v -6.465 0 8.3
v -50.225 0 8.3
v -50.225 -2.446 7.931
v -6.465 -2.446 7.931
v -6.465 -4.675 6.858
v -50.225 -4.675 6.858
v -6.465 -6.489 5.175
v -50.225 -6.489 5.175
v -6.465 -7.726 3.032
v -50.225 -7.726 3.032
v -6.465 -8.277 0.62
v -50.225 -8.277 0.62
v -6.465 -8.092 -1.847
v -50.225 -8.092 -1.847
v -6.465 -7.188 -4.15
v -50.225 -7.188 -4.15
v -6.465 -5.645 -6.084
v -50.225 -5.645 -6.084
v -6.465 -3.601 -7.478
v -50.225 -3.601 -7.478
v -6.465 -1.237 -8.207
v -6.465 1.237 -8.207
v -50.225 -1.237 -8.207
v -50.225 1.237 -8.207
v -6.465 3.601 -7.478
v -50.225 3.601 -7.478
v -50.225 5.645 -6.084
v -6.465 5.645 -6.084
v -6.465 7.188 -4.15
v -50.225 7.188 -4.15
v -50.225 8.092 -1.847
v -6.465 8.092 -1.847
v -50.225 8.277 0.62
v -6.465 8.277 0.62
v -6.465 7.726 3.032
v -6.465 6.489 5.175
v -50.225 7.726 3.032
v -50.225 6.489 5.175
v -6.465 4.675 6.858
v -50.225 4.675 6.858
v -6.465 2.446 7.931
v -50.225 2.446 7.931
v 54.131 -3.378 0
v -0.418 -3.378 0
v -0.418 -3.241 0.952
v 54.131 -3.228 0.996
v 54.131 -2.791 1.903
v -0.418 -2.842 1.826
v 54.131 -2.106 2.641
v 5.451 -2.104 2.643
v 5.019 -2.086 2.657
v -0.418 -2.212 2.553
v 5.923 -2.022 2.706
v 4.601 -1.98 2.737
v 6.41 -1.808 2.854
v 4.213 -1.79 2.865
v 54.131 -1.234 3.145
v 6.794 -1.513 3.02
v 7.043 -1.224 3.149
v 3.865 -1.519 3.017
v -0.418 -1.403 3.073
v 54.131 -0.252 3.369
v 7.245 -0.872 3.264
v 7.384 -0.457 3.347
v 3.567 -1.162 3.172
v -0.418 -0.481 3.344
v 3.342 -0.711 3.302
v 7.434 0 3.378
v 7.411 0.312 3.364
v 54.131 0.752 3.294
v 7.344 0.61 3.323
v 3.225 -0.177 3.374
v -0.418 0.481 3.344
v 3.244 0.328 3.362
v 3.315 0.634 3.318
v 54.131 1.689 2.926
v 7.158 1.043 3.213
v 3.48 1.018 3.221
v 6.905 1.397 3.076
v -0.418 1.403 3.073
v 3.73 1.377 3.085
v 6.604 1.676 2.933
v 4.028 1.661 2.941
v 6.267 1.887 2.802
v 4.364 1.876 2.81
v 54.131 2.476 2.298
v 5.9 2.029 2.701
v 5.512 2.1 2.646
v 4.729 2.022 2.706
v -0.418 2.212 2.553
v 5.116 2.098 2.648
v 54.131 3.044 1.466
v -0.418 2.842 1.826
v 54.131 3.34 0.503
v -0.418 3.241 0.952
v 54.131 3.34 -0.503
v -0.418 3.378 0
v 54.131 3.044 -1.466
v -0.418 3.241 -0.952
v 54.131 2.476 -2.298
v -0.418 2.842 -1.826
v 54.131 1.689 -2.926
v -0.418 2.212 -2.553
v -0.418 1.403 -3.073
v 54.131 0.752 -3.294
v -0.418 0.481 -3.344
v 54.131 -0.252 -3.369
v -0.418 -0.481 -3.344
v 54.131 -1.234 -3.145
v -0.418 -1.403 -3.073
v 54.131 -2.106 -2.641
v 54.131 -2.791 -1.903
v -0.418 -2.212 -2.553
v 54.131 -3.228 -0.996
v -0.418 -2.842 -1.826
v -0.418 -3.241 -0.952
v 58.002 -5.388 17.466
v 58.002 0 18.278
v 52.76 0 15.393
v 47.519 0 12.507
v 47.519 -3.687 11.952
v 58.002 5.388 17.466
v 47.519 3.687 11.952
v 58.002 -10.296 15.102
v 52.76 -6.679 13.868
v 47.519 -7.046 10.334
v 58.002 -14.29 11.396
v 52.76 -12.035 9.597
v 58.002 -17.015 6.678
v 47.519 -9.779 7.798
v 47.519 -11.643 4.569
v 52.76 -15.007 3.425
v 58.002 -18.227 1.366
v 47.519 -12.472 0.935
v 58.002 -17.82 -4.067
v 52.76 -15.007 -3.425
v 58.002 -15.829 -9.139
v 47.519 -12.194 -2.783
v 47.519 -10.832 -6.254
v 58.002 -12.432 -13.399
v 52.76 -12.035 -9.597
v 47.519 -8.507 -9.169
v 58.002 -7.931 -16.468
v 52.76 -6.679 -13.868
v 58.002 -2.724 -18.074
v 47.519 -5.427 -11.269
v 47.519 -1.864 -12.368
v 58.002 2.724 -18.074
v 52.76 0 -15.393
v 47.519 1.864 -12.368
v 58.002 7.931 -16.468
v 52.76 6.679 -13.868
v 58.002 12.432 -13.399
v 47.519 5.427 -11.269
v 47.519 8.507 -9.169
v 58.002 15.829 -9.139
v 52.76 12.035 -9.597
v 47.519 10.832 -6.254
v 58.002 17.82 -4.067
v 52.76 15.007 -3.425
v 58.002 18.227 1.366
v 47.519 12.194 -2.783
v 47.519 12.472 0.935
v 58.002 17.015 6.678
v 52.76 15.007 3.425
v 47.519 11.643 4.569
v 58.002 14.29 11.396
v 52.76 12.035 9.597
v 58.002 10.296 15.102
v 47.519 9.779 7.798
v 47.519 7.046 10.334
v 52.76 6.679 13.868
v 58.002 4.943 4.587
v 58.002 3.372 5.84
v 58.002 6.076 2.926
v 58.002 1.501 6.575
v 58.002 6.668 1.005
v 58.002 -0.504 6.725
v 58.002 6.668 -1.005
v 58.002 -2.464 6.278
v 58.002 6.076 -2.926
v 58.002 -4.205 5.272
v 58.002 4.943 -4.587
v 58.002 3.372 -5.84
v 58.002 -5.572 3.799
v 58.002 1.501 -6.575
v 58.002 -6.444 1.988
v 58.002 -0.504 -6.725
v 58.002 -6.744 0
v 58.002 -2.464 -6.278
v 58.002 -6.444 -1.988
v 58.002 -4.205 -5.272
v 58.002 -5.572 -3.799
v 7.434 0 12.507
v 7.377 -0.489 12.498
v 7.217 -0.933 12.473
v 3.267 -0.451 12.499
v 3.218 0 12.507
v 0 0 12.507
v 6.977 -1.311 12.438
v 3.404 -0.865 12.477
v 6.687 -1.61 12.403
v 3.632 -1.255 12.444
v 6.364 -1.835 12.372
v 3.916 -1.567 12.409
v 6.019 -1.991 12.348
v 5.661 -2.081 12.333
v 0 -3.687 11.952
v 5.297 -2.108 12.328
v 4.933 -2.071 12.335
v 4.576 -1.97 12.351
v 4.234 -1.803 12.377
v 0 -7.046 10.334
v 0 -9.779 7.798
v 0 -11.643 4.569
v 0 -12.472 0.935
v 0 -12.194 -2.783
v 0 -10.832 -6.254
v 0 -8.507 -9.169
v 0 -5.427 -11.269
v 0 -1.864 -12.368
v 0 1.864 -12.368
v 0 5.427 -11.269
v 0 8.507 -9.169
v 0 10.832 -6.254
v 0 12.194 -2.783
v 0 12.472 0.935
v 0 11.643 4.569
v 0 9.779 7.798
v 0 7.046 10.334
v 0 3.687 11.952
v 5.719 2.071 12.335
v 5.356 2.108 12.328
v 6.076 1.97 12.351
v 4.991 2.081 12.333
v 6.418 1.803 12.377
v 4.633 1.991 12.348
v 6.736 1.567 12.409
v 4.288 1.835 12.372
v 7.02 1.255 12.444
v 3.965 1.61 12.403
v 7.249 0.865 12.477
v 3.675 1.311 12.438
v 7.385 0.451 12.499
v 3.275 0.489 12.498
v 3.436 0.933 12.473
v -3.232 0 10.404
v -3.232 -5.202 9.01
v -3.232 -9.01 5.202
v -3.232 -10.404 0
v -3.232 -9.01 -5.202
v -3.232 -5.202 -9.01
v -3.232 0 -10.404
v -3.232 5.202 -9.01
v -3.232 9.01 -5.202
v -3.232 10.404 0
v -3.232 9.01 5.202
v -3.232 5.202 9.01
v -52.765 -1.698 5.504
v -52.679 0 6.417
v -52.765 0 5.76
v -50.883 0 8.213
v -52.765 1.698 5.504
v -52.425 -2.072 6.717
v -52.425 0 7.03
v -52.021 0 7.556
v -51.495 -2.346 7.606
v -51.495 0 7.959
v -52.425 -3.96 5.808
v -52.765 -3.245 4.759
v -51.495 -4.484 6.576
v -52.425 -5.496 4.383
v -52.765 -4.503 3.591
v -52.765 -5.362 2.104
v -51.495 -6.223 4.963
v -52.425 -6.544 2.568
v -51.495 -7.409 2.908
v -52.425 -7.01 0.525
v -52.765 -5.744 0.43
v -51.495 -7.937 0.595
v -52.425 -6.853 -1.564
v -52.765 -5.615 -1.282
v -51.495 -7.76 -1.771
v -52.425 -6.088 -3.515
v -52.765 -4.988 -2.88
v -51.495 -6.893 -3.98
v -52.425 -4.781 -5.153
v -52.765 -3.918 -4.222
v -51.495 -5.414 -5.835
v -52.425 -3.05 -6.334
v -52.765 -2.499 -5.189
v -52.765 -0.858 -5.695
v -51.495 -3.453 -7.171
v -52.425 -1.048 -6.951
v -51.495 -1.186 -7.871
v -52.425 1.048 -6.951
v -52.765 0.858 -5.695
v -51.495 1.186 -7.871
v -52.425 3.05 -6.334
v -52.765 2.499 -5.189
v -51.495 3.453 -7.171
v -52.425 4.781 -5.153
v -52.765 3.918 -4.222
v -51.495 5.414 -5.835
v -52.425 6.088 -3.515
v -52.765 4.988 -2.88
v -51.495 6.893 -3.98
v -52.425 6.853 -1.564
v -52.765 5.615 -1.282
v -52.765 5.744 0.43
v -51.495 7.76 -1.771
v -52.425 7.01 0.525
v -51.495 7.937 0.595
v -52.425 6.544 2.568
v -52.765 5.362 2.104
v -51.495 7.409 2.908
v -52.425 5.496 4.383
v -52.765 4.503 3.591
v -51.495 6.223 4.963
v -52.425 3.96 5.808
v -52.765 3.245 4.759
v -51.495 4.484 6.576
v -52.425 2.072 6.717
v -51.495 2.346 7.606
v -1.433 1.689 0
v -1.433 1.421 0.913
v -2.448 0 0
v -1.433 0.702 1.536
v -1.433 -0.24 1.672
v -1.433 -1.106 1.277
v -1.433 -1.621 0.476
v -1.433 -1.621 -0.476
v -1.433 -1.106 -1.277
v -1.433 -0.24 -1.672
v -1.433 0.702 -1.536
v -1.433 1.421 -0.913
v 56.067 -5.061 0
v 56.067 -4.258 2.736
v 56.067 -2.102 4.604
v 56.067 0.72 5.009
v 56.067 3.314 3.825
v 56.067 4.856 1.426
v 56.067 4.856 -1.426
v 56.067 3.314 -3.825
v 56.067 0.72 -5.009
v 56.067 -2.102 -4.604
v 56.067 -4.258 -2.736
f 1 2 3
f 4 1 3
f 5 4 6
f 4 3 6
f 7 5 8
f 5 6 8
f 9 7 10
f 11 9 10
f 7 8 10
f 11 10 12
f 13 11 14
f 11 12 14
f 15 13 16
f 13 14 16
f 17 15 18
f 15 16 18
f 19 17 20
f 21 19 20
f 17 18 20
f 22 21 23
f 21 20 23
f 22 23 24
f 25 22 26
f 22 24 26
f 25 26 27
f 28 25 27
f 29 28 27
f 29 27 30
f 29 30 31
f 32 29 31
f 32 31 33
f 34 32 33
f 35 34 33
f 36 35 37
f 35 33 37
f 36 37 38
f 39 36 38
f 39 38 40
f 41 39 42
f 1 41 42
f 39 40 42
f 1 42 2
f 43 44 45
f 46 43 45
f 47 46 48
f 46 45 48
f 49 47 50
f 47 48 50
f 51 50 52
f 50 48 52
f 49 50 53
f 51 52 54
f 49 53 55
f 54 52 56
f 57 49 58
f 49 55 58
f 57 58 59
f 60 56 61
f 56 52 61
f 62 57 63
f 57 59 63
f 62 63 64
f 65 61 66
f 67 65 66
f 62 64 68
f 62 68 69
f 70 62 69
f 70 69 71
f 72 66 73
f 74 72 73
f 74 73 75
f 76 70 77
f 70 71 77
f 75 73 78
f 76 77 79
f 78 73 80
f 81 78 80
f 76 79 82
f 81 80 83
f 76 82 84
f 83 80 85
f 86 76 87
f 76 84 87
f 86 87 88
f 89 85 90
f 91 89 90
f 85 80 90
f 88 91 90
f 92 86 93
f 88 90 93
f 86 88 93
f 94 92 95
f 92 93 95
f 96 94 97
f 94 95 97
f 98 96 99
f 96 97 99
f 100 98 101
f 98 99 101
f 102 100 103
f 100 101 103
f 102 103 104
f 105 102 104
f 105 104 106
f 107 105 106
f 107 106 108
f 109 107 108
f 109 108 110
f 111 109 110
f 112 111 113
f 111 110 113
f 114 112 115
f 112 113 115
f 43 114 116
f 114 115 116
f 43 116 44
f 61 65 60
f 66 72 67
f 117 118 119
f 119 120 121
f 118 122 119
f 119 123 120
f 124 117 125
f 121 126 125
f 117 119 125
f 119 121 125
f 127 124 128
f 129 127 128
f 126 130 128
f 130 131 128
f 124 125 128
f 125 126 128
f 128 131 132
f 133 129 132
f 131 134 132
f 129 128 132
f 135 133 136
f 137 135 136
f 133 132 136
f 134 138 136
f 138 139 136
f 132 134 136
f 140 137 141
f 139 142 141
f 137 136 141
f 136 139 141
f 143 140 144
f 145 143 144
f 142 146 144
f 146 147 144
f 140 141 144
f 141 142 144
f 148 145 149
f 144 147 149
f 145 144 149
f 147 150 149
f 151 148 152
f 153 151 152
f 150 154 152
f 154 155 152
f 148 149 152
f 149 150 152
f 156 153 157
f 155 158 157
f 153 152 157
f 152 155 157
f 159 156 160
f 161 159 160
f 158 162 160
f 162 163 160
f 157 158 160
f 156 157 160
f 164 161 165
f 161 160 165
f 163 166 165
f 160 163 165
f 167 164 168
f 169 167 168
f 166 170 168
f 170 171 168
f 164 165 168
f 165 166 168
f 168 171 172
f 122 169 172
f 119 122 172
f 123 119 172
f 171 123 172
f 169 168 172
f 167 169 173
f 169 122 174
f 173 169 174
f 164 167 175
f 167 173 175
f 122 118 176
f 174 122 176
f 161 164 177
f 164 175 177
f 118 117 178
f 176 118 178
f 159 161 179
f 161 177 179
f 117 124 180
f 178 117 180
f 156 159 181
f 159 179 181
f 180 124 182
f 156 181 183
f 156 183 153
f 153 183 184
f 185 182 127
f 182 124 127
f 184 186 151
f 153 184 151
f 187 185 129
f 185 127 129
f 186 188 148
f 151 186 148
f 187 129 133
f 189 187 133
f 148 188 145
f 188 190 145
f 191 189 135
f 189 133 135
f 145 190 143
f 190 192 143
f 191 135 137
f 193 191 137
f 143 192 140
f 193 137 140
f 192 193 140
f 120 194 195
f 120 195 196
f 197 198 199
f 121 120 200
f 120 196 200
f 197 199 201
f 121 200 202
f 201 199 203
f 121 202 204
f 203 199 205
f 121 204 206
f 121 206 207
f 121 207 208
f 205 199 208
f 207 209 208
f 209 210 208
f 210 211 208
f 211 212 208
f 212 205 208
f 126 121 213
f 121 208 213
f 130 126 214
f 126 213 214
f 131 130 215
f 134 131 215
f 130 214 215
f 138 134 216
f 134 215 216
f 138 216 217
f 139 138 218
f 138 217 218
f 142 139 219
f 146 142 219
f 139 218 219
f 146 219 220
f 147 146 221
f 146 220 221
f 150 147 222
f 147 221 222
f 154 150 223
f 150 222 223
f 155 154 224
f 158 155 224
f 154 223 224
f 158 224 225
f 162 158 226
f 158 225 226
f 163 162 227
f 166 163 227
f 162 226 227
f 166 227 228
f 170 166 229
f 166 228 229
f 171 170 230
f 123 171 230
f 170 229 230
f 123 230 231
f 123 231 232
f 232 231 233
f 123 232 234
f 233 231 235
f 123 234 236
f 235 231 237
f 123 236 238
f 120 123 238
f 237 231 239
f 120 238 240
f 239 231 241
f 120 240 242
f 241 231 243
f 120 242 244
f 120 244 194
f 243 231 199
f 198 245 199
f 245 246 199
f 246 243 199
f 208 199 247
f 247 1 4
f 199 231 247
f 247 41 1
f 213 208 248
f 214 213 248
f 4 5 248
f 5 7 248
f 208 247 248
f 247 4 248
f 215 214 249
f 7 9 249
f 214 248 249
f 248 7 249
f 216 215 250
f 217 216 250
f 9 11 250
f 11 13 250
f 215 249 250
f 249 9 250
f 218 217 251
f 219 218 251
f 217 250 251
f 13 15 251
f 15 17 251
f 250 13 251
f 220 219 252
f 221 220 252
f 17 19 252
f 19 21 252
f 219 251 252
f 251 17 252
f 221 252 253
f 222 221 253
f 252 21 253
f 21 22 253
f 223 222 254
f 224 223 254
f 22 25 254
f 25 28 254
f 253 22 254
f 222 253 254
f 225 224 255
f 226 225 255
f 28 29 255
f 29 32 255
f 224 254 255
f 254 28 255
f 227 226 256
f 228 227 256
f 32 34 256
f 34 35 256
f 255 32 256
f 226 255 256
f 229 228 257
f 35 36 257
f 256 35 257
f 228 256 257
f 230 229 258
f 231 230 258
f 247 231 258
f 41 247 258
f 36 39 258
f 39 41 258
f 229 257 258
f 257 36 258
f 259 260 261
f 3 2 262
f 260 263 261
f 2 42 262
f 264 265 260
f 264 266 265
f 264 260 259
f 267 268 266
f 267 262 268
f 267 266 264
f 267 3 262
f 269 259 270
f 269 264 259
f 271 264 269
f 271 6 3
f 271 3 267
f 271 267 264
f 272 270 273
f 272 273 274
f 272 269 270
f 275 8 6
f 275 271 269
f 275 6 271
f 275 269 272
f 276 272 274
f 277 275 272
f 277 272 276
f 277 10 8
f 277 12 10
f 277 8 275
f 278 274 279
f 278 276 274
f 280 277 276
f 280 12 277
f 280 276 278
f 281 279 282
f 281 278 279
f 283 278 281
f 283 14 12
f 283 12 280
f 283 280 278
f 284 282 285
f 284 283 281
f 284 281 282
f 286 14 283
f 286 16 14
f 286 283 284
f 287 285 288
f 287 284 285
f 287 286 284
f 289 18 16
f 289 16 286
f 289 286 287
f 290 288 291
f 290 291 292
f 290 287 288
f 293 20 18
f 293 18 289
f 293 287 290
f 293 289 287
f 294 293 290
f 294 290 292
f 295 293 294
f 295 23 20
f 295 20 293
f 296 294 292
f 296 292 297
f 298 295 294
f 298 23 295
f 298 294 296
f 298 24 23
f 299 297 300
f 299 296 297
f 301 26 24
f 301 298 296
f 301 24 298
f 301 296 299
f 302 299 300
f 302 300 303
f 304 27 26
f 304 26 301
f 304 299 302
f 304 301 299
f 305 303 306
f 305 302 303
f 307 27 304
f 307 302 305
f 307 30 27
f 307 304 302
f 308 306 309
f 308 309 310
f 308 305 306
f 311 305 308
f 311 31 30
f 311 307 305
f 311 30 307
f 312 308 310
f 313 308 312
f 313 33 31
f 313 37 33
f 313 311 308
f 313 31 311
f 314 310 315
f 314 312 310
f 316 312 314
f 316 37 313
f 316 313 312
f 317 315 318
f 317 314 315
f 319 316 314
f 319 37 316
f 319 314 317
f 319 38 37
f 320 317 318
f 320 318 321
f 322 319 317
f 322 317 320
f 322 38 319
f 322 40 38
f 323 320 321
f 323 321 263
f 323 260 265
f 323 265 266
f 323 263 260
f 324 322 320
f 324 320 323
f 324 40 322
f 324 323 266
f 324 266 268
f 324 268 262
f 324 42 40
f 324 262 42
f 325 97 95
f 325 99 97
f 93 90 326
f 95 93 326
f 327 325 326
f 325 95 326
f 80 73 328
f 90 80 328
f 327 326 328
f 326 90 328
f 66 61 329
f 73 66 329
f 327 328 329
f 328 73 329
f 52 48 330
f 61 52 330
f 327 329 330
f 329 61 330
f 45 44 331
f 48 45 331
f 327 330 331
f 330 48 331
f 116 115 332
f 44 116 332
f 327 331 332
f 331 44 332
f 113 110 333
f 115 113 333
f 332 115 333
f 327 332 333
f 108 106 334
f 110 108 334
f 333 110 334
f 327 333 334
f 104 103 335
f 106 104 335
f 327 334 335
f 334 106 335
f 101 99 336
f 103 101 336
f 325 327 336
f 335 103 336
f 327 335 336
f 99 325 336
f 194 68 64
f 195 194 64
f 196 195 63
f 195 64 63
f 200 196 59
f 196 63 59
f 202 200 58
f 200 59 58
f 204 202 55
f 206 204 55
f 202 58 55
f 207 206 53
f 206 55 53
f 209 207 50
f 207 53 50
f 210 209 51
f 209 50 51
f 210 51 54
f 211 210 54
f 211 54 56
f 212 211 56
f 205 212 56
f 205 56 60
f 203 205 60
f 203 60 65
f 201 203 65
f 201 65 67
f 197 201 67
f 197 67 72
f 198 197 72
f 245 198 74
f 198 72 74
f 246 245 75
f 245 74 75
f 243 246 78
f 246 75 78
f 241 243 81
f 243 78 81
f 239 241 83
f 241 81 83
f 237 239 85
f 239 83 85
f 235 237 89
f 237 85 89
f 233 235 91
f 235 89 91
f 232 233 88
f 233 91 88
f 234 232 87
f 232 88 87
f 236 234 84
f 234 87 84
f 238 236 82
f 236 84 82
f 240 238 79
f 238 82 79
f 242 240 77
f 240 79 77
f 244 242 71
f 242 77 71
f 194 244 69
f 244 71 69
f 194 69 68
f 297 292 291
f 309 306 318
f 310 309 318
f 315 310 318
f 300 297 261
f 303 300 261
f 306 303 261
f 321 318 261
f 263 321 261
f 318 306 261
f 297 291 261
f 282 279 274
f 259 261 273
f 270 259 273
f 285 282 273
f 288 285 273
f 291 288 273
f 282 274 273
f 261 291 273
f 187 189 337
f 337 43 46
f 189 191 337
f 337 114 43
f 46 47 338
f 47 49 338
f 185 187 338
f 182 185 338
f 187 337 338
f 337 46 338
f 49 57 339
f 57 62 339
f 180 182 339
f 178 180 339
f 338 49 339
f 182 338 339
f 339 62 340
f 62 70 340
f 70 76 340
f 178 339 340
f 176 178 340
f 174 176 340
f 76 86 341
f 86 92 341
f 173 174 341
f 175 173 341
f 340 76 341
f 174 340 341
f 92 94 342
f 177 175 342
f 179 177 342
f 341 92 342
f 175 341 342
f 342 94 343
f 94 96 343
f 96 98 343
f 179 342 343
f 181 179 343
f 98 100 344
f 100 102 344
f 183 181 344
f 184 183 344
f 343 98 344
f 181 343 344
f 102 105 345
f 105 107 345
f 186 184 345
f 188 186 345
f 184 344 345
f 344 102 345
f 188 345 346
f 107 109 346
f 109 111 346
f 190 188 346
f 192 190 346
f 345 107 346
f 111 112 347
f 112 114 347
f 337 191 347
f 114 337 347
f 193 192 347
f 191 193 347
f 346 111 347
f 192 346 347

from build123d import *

# Parameters (mm, degrees)
F2_R           = 2.54
F4_D           = 6.7564
F4_DEPTH       = 58.42
F4_CSINK_D     = 13.4874
F4_CSINK_ANGLE = 82
F4_TIP         = 2.0298273432
F6_D           = 4.2164
F6_DEPTH       = 18.2792094926


with BuildPart() as f1:
    # F0 (on Front) → F1 (revolve)
    with BuildSketch(Plane.XZ):
        Polygon((-52.7651011944, 8.2997372374), (-52.7651011944, 0), (58.0023080111, 0), (58.0023080111, 12.5073799863), (58.0023080111, 18.2782094926), (47.5186370313, 12.5073799863), (0, 12.5073799863), (-6.4646434039, 8.2997372374), align=None)
    revolve(axis=Axis((-11.7605924606, 0, 0), (1, 0, 0)))

    # F2
    f2_edges = [f1.edges().sort_by_distance(p)[0] for p in [
        (-52.765101, 0, -8.299737),
    ]]
    fillet(f2_edges, radius=F2_R)

    # F4
    with Locations(Plane.YZ.offset(58.0023080111)):
        with Locations((0, 0)):
            CounterSinkHole(F4_D / 2, F4_CSINK_D / 2, depth=F4_DEPTH, counter_sink_angle=F4_CSINK_ANGLE)
            with Locations((0, 0, -(F4_DEPTH + F4_TIP / 2))):  # 118° drill point
                Cone(0, F4_D / 2, F4_TIP, mode=Mode.SUBTRACT)

    # F6 (through all, one way)
    with BuildSketch(Plane(origin=(0, 0, 0), x_dir=(1, 0, 0), z_dir=(0, 0, -1))):
        with Locations((5.3260941058, 0)):
            Circle(F6_D / 2)
    extrude(amount=-F6_DEPTH, mode=Mode.SUBTRACT)


solid = f1.part
